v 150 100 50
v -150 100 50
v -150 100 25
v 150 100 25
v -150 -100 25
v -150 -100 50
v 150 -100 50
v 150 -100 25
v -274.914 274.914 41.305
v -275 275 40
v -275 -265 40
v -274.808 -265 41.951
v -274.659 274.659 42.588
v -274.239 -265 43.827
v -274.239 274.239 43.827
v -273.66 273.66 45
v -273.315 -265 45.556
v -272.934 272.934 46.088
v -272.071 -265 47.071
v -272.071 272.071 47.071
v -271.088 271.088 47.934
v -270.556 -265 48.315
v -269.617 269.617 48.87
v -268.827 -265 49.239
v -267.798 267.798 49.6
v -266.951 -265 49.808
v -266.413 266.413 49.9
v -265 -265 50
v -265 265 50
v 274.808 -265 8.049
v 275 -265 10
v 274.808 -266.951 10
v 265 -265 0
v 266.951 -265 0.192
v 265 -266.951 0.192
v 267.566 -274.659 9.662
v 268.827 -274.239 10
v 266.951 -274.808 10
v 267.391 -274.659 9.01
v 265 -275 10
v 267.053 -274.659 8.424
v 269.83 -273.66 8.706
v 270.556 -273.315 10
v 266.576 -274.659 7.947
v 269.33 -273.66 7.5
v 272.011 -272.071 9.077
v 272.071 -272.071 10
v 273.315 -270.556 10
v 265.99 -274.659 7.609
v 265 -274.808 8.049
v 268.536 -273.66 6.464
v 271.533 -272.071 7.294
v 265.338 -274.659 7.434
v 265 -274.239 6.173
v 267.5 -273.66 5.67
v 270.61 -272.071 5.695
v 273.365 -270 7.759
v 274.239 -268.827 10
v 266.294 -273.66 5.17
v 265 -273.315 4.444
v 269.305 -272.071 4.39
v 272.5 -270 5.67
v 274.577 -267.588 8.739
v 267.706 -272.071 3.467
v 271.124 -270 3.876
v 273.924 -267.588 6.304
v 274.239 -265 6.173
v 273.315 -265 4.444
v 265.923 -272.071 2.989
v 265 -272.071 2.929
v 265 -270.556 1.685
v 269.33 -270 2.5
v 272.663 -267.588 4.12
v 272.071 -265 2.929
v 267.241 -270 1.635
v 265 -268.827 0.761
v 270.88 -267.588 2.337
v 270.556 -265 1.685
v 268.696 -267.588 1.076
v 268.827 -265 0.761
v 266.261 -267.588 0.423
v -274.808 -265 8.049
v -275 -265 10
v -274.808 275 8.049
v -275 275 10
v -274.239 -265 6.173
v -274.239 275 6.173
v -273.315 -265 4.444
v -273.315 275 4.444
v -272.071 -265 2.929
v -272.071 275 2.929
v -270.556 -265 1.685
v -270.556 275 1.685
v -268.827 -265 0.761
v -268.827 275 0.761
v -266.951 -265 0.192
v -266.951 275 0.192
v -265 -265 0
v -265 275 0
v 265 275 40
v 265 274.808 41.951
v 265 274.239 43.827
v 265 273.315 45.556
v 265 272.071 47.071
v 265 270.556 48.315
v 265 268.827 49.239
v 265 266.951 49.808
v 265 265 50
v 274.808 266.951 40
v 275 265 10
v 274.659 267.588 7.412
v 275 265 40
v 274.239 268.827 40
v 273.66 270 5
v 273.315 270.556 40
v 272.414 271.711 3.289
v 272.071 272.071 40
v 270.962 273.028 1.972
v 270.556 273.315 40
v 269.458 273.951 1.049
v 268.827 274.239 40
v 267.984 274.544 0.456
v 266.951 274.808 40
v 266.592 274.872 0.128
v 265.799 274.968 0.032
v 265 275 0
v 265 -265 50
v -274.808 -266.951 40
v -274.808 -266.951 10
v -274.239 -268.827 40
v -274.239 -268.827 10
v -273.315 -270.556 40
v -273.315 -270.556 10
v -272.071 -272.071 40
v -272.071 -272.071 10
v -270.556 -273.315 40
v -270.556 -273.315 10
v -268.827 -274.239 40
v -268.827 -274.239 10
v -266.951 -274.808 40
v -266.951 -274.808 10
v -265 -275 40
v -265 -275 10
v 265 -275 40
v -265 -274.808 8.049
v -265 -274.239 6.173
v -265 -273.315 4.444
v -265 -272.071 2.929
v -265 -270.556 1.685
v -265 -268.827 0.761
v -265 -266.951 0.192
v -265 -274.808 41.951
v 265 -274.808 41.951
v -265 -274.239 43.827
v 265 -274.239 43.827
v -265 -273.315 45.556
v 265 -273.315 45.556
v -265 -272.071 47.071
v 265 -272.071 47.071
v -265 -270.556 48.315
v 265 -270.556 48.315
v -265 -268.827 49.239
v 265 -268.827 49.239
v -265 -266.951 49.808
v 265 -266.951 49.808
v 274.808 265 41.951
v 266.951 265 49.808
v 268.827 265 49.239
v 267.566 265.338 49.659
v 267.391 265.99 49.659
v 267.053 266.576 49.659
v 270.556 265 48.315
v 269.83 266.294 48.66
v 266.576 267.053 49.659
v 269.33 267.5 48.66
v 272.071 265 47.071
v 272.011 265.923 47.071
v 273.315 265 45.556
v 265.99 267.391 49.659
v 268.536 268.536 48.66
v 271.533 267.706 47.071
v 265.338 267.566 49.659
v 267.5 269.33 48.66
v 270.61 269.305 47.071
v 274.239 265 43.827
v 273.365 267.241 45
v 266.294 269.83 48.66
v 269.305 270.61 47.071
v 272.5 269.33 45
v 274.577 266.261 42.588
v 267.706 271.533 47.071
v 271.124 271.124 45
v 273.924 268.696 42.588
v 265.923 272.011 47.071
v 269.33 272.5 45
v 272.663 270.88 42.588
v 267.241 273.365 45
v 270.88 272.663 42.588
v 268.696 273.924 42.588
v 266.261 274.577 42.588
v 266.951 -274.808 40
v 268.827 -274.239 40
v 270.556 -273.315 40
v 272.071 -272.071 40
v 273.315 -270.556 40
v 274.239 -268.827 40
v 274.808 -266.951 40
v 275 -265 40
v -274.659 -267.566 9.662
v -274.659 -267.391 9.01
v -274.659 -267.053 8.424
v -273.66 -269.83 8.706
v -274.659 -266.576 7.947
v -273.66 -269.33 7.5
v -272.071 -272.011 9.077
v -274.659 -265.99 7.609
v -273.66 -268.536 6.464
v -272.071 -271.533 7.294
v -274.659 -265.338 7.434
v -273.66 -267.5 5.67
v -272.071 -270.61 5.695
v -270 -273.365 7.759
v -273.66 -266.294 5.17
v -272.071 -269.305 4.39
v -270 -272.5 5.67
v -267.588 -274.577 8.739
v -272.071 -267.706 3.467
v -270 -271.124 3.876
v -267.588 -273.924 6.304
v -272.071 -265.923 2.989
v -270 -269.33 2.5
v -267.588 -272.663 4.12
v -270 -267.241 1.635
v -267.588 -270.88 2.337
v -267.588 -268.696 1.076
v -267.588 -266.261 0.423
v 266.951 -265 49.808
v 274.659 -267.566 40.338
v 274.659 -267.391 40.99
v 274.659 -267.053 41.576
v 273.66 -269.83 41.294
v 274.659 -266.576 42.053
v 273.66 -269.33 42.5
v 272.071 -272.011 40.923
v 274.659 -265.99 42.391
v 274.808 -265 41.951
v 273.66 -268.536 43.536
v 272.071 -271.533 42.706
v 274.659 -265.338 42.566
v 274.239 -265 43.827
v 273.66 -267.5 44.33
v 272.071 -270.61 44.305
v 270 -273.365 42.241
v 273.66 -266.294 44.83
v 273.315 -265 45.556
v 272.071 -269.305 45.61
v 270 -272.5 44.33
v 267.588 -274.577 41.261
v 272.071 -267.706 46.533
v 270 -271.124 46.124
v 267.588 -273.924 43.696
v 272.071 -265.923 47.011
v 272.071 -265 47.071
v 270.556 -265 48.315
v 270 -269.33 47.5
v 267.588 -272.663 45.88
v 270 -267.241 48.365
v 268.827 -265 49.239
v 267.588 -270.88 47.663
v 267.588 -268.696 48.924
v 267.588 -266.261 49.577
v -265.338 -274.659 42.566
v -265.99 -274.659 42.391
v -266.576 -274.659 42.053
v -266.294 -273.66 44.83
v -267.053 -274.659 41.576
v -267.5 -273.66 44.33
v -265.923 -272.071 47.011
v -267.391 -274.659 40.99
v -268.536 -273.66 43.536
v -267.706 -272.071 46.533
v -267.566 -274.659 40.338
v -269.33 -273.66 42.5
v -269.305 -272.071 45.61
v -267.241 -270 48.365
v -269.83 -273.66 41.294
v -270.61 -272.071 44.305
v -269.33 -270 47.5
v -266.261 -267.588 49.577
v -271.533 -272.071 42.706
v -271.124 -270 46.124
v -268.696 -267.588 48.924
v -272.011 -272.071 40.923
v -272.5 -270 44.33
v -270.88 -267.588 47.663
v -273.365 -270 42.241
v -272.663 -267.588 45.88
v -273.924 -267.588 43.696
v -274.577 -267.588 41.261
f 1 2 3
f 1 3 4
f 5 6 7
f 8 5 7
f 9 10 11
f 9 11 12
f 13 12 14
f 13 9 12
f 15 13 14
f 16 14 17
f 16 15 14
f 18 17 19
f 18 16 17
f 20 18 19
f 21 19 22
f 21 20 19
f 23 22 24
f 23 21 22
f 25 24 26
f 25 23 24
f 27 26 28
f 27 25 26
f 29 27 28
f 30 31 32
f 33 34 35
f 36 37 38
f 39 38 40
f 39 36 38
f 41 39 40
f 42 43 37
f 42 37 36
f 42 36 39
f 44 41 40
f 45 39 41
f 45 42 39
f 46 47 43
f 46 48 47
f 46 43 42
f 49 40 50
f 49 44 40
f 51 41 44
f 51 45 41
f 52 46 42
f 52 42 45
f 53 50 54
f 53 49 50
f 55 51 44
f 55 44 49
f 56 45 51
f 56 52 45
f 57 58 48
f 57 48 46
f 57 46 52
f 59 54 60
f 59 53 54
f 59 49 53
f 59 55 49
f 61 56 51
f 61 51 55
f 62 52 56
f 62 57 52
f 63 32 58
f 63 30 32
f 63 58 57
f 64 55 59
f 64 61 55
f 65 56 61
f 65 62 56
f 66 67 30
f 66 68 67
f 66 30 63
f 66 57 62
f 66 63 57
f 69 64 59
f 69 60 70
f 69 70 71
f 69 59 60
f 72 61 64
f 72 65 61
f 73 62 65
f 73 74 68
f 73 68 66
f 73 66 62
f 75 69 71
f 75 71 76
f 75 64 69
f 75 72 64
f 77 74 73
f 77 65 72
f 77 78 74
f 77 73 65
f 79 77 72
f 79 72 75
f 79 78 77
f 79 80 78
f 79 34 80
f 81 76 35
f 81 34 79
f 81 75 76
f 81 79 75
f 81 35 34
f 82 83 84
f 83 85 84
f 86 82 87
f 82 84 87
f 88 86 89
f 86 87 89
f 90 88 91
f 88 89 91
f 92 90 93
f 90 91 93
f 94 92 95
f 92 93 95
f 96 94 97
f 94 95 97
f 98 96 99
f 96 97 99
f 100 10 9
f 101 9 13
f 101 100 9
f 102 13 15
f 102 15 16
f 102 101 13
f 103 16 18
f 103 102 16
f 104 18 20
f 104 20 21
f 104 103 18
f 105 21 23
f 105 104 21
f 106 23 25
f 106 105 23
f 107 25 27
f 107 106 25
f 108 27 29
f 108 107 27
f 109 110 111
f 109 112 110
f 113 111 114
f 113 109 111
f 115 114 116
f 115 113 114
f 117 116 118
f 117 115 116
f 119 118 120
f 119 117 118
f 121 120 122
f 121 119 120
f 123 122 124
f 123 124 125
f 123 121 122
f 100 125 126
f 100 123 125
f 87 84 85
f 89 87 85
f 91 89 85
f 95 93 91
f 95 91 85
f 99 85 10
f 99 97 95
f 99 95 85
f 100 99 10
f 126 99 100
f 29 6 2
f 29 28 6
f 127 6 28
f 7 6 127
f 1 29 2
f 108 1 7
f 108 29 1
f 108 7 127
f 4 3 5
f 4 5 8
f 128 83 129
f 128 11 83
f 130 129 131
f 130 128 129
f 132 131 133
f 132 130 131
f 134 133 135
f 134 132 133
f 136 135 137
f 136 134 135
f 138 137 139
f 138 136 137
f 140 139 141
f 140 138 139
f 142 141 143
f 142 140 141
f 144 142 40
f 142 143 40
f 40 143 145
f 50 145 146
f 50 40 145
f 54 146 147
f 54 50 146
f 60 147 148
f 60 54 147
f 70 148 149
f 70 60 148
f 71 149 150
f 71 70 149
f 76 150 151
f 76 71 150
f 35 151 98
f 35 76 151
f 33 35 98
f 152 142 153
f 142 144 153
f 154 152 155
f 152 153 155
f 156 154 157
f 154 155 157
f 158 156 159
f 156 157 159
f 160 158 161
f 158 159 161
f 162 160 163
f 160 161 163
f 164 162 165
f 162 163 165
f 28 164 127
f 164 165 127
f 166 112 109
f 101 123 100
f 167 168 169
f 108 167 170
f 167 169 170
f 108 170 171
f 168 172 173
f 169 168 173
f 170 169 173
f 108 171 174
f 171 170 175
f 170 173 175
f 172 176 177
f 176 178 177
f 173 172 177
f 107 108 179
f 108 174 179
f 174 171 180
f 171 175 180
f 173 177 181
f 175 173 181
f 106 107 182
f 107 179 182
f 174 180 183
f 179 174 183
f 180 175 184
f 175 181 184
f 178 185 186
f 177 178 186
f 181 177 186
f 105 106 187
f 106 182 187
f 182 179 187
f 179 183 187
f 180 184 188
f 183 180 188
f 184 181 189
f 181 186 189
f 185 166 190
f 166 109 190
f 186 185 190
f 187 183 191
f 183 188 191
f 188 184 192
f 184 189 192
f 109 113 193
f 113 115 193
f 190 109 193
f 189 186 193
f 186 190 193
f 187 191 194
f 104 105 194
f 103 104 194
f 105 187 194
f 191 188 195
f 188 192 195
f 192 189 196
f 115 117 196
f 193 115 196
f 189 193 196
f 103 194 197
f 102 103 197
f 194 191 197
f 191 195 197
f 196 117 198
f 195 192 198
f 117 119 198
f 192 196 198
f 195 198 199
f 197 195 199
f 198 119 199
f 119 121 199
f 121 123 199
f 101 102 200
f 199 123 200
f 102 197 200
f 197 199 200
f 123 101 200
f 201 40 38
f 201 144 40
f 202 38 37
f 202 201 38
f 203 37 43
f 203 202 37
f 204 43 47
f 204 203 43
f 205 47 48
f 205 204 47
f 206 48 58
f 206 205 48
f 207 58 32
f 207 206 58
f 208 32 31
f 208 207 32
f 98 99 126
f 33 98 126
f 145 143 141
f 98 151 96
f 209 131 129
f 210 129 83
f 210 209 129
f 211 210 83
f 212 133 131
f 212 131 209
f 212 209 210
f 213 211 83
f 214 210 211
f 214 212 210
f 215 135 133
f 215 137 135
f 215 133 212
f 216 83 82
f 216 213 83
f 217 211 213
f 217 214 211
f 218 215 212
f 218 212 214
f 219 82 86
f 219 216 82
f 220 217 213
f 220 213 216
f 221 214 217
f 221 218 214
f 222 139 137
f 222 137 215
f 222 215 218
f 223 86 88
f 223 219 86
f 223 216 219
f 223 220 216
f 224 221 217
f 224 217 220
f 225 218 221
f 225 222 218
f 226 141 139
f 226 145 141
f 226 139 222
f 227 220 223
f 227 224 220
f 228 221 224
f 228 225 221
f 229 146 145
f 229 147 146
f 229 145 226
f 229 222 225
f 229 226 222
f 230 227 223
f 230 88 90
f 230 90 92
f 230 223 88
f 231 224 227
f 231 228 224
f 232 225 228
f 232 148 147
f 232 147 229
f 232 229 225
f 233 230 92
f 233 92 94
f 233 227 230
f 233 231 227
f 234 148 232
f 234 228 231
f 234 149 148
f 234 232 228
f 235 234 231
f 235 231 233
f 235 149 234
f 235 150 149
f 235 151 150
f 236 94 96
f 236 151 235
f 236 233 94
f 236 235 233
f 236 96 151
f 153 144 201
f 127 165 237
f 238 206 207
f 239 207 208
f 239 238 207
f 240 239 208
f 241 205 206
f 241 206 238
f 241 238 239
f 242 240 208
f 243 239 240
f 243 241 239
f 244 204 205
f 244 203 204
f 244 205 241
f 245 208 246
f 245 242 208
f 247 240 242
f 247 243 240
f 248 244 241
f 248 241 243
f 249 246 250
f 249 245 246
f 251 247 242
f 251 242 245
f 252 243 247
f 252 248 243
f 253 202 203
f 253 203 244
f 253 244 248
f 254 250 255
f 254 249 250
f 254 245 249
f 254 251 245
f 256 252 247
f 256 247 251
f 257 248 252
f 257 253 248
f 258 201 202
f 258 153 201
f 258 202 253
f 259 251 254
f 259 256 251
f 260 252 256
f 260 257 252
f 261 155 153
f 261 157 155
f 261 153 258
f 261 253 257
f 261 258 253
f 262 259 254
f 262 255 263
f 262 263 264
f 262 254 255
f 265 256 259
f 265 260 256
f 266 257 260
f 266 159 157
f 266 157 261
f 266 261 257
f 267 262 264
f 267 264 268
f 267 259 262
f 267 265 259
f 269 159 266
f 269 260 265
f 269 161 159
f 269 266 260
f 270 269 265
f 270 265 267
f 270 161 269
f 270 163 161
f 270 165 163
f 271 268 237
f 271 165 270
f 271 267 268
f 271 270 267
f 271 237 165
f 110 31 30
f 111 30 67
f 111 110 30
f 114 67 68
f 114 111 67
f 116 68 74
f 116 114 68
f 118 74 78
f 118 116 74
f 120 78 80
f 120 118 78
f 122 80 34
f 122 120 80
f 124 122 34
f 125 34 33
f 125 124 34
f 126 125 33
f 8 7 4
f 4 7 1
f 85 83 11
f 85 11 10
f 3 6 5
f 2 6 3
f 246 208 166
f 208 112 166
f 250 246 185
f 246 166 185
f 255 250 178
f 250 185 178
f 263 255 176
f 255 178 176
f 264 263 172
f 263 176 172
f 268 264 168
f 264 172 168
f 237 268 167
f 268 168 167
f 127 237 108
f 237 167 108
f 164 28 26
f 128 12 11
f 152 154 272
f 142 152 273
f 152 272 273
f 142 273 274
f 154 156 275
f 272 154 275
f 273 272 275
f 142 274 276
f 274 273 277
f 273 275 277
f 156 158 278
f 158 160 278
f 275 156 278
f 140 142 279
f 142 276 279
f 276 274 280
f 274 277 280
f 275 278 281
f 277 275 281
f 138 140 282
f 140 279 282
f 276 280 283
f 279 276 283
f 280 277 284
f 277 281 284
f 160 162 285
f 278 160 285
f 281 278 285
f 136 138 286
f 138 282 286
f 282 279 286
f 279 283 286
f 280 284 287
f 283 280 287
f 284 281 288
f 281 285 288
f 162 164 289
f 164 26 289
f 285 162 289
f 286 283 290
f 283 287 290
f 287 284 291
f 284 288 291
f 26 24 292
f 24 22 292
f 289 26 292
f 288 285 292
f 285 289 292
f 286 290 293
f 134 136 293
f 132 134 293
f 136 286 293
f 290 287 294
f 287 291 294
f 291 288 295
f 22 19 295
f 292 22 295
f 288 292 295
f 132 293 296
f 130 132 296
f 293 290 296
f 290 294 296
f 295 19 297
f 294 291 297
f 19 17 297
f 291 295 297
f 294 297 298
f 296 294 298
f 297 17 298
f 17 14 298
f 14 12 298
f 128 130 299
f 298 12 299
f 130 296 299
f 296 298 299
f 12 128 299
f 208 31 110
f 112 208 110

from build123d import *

# Parameters (mm, degrees)
F0_W     = 550
F0_H     = 550
F1_DEPTH = 50
F2_R     = 10
F3_W     = 300
F3_H     = 200
F4_DEPTH = 25


with BuildPart() as f1:
    # F0 (on Top) → F1 (new body)
    with BuildSketch(Plane.XY):
        Rectangle(F0_W, F0_H)
    extrude(amount=F1_DEPTH)

    # F2
    f2_edges = [f1.edges().sort_by_distance(p)[0] for p in [
        (-275, 0, 50),
        (0, -275, 50),
        (275, 0, 0),
        (275, -275, 25),
        (275, 275, 25),
        (275, 0, 50),
        (0, 275, 50),
        (0, -275, 0),
        (-275, -275, 25),
        (-275, 0, 0),
    ]]
    fillet(f2_edges, radius=F2_R)

    # F3 (on face) → F4 (cut)
    with BuildSketch(Plane.XY.offset(50)):
        Rectangle(F3_W, F3_H)
    extrude(amount=-F4_DEPTH, mode=Mode.SUBTRACT)


solid = f1.part
